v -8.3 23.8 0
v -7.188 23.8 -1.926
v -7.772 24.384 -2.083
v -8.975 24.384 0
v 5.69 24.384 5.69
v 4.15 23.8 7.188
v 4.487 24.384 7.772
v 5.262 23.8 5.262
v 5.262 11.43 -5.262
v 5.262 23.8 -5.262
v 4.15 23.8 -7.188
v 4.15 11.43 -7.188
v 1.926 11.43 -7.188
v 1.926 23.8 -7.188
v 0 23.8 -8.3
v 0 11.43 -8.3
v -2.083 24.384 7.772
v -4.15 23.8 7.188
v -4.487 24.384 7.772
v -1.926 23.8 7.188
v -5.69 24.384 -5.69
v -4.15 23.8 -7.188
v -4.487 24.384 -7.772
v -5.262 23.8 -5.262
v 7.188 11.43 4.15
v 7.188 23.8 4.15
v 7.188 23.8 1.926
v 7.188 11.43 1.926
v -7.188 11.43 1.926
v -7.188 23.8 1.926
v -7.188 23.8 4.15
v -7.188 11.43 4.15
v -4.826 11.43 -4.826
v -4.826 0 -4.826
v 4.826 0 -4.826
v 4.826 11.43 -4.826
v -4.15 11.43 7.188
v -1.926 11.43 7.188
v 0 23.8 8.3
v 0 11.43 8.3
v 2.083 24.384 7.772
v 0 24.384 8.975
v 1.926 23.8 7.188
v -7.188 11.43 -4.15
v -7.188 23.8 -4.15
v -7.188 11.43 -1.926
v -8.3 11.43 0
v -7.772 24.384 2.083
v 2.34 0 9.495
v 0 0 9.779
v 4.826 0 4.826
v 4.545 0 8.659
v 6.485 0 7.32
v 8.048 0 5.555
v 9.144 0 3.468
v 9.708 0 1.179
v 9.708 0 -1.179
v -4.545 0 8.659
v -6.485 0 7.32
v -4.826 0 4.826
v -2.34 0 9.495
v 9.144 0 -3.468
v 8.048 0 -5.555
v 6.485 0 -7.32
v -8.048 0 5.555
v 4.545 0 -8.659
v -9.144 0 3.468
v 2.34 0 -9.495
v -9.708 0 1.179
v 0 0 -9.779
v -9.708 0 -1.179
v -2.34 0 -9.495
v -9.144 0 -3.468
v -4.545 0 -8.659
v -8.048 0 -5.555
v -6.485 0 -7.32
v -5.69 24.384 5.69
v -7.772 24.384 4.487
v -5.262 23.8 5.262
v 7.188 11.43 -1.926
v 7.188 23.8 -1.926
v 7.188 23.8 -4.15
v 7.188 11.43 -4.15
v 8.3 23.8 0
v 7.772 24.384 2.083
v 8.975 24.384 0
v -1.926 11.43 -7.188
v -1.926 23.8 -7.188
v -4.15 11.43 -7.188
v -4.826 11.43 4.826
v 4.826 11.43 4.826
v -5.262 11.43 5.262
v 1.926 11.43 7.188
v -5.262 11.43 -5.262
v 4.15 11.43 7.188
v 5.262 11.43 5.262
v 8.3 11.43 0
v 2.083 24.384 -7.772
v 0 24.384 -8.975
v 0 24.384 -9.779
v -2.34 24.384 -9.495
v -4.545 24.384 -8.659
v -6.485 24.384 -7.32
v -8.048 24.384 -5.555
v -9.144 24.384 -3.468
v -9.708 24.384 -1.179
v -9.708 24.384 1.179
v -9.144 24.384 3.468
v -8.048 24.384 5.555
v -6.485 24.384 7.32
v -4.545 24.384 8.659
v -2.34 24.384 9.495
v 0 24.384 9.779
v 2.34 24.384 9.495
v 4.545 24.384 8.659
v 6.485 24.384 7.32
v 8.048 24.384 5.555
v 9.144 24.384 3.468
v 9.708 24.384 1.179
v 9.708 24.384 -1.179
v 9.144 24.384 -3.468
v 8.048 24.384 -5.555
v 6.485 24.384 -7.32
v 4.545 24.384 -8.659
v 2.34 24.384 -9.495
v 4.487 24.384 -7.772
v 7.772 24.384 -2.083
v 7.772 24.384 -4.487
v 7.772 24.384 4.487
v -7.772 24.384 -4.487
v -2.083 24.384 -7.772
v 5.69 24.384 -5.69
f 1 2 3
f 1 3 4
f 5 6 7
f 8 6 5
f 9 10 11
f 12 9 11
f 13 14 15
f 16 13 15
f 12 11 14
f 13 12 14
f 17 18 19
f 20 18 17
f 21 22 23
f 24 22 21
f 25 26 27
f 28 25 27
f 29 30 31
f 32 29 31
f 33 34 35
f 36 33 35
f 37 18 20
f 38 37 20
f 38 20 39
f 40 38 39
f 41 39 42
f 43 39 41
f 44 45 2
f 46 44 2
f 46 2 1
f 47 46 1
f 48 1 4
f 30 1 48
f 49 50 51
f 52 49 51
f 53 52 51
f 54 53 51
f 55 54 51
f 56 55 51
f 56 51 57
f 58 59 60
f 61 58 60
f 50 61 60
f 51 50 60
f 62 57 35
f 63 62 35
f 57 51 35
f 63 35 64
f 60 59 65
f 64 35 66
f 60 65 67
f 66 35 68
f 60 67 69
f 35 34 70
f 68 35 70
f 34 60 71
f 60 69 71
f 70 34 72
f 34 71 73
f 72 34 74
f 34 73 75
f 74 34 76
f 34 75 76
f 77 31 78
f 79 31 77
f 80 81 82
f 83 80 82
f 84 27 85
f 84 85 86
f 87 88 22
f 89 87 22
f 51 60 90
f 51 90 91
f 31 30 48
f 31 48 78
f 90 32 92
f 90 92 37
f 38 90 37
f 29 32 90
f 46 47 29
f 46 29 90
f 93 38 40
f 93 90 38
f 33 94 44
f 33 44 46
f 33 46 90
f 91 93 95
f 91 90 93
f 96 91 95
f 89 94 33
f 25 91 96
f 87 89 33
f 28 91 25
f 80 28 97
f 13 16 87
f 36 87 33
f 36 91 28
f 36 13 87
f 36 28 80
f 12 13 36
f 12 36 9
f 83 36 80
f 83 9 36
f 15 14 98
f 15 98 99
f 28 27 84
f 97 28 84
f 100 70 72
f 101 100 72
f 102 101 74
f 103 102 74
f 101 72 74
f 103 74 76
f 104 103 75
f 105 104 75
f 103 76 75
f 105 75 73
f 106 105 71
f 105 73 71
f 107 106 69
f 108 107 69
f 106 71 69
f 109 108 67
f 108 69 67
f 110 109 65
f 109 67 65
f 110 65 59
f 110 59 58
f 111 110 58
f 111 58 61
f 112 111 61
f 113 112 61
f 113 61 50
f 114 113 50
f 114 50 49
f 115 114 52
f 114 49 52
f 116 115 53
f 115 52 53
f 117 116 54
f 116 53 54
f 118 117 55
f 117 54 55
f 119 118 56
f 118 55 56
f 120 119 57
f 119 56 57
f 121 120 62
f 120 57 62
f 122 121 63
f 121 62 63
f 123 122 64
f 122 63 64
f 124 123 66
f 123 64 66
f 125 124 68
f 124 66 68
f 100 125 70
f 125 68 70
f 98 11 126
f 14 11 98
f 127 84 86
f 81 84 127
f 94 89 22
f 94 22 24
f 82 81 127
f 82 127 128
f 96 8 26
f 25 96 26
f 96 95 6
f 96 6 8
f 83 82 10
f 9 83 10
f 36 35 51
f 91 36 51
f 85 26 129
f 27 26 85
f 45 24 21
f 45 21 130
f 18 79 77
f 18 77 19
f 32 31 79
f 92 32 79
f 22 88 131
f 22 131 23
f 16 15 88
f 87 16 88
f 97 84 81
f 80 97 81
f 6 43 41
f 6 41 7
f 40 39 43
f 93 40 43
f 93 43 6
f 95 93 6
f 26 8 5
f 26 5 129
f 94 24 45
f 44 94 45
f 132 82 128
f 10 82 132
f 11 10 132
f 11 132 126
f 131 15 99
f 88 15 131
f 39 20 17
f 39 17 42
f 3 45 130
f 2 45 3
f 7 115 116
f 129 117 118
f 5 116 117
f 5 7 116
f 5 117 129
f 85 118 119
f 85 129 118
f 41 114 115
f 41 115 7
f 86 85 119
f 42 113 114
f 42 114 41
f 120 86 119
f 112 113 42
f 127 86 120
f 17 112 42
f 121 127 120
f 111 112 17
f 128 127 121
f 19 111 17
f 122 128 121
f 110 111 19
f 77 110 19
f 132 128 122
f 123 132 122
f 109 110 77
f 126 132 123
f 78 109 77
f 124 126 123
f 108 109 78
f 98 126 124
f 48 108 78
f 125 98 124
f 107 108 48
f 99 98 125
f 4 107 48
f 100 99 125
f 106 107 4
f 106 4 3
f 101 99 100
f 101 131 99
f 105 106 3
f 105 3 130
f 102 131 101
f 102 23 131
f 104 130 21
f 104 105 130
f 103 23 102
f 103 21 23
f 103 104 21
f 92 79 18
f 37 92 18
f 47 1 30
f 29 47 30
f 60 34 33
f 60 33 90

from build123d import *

# Parameters (mm, degrees)
SKETCH1_R           = 9.779
BOSS_EXTRUDE1_DEPTH = 24.384
SKETCH2_W           = 9.652
SKETCH2_H           = 9.652
CUT_EXTRUDE1_DEPTH  = 11.43
CUT_EXTRUDE2_DEPTH  = 12.954
CIRPATTERN1_COUNT   = 2
CIRPATTERN1_ANGLE   = 30
CHAMFER1_SIZE       = 0.5842


with BuildPart() as part:
    # Sketch1 → Boss-Extrude1 (new body)
    with BuildSketch(Plane(origin=(0, 0, 0), x_dir=(1, 0, 0), z_dir=(0, 1, 0))):
        with Locations(Location((0, 0, 0), (0, 0, 90))):
            Circle(SKETCH1_R)
    extrude(amount=BOSS_EXTRUDE1_DEPTH)

    # Sketch2 → Cut-Extrude1 (cut)
    with BuildSketch(Plane.XZ):
        Rectangle(SKETCH2_W, SKETCH2_H)
    extrude(amount=-CUT_EXTRUDE1_DEPTH, mode=Mode.SUBTRACT)

    # Sketch3 → Cut-Extrude2 (cut)
    with BuildSketch(Plane(origin=(0, 24.384, 0), x_dir=(1, 0, 0), z_dir=(0, 1, 0))):
        Polygon((8.30021841, 0), (4.150109205, 7.1882), (-4.150109205, 7.1882), (-8.30021841, 0), (-4.150109205, -7.1882), (4.150109205, -7.1882), align=None)
    cut_extrude2 = extrude(amount=-CUT_EXTRUDE2_DEPTH, mode=Mode.SUBTRACT)

    # CirPattern1: Cut-Extrude2 ×2 about axis
    cirpattern1_axis = Axis((0, 0, 0), (0, 1, 0))
    for i in range(1, CIRPATTERN1_COUNT):
        add(cut_extrude2.rotate(cirpattern1_axis, i * CIRPATTERN1_ANGLE / (CIRPATTERN1_COUNT - 1)), mode=Mode.SUBTRACT)

    # Chamfer1
    chamfer1_edges = [part.edges().sort_by_distance(p)[0] for p in [
        (4.70611841, 24.384, 6.225163807),
        (7.744209205, 24.384, -0.963036193),
        (3.038090795, 24.384, -7.1882),
        (-4.70611841, 24.384, -6.225163807),
        (-7.744209205, 24.384, 0.963036193),
        (-3.038090795, 24.384, 7.1882),
        (7.744209205, 24.384, 0.963036193),
        (3.038090795, 24.384, 7.1882),
        (-4.70611841, 24.384, 6.225163807),
        (-7.744209205, 24.384, -0.963036193),
        (-3.038090795, 24.384, -7.1882),
        (4.70611841, 24.384, -6.225163807),
        (7.1882, 24.384, -3.038090795),
        (6.225163807, 24.384, -4.70611841),
        (0.963036193, 24.384, -7.744209205),
        (-0.963036193, 24.384, -7.744209205),
        (-6.225163807, 24.384, -4.70611841),
        (-7.1882, 24.384, -3.038090795),
        (-7.1882, 24.384, 3.038090795),
        (-6.225163807, 24.384, 4.70611841),
        (-0.963036193, 24.384, 7.744209205),
        (0.963036193, 24.384, 7.744209205),
        (6.225163807, 24.384, 4.70611841),
        (7.1882, 24.384, 3.038090795),
    ]]
    chamfer(chamfer1_edges, length=CHAMFER1_SIZE)


solid = part.part
